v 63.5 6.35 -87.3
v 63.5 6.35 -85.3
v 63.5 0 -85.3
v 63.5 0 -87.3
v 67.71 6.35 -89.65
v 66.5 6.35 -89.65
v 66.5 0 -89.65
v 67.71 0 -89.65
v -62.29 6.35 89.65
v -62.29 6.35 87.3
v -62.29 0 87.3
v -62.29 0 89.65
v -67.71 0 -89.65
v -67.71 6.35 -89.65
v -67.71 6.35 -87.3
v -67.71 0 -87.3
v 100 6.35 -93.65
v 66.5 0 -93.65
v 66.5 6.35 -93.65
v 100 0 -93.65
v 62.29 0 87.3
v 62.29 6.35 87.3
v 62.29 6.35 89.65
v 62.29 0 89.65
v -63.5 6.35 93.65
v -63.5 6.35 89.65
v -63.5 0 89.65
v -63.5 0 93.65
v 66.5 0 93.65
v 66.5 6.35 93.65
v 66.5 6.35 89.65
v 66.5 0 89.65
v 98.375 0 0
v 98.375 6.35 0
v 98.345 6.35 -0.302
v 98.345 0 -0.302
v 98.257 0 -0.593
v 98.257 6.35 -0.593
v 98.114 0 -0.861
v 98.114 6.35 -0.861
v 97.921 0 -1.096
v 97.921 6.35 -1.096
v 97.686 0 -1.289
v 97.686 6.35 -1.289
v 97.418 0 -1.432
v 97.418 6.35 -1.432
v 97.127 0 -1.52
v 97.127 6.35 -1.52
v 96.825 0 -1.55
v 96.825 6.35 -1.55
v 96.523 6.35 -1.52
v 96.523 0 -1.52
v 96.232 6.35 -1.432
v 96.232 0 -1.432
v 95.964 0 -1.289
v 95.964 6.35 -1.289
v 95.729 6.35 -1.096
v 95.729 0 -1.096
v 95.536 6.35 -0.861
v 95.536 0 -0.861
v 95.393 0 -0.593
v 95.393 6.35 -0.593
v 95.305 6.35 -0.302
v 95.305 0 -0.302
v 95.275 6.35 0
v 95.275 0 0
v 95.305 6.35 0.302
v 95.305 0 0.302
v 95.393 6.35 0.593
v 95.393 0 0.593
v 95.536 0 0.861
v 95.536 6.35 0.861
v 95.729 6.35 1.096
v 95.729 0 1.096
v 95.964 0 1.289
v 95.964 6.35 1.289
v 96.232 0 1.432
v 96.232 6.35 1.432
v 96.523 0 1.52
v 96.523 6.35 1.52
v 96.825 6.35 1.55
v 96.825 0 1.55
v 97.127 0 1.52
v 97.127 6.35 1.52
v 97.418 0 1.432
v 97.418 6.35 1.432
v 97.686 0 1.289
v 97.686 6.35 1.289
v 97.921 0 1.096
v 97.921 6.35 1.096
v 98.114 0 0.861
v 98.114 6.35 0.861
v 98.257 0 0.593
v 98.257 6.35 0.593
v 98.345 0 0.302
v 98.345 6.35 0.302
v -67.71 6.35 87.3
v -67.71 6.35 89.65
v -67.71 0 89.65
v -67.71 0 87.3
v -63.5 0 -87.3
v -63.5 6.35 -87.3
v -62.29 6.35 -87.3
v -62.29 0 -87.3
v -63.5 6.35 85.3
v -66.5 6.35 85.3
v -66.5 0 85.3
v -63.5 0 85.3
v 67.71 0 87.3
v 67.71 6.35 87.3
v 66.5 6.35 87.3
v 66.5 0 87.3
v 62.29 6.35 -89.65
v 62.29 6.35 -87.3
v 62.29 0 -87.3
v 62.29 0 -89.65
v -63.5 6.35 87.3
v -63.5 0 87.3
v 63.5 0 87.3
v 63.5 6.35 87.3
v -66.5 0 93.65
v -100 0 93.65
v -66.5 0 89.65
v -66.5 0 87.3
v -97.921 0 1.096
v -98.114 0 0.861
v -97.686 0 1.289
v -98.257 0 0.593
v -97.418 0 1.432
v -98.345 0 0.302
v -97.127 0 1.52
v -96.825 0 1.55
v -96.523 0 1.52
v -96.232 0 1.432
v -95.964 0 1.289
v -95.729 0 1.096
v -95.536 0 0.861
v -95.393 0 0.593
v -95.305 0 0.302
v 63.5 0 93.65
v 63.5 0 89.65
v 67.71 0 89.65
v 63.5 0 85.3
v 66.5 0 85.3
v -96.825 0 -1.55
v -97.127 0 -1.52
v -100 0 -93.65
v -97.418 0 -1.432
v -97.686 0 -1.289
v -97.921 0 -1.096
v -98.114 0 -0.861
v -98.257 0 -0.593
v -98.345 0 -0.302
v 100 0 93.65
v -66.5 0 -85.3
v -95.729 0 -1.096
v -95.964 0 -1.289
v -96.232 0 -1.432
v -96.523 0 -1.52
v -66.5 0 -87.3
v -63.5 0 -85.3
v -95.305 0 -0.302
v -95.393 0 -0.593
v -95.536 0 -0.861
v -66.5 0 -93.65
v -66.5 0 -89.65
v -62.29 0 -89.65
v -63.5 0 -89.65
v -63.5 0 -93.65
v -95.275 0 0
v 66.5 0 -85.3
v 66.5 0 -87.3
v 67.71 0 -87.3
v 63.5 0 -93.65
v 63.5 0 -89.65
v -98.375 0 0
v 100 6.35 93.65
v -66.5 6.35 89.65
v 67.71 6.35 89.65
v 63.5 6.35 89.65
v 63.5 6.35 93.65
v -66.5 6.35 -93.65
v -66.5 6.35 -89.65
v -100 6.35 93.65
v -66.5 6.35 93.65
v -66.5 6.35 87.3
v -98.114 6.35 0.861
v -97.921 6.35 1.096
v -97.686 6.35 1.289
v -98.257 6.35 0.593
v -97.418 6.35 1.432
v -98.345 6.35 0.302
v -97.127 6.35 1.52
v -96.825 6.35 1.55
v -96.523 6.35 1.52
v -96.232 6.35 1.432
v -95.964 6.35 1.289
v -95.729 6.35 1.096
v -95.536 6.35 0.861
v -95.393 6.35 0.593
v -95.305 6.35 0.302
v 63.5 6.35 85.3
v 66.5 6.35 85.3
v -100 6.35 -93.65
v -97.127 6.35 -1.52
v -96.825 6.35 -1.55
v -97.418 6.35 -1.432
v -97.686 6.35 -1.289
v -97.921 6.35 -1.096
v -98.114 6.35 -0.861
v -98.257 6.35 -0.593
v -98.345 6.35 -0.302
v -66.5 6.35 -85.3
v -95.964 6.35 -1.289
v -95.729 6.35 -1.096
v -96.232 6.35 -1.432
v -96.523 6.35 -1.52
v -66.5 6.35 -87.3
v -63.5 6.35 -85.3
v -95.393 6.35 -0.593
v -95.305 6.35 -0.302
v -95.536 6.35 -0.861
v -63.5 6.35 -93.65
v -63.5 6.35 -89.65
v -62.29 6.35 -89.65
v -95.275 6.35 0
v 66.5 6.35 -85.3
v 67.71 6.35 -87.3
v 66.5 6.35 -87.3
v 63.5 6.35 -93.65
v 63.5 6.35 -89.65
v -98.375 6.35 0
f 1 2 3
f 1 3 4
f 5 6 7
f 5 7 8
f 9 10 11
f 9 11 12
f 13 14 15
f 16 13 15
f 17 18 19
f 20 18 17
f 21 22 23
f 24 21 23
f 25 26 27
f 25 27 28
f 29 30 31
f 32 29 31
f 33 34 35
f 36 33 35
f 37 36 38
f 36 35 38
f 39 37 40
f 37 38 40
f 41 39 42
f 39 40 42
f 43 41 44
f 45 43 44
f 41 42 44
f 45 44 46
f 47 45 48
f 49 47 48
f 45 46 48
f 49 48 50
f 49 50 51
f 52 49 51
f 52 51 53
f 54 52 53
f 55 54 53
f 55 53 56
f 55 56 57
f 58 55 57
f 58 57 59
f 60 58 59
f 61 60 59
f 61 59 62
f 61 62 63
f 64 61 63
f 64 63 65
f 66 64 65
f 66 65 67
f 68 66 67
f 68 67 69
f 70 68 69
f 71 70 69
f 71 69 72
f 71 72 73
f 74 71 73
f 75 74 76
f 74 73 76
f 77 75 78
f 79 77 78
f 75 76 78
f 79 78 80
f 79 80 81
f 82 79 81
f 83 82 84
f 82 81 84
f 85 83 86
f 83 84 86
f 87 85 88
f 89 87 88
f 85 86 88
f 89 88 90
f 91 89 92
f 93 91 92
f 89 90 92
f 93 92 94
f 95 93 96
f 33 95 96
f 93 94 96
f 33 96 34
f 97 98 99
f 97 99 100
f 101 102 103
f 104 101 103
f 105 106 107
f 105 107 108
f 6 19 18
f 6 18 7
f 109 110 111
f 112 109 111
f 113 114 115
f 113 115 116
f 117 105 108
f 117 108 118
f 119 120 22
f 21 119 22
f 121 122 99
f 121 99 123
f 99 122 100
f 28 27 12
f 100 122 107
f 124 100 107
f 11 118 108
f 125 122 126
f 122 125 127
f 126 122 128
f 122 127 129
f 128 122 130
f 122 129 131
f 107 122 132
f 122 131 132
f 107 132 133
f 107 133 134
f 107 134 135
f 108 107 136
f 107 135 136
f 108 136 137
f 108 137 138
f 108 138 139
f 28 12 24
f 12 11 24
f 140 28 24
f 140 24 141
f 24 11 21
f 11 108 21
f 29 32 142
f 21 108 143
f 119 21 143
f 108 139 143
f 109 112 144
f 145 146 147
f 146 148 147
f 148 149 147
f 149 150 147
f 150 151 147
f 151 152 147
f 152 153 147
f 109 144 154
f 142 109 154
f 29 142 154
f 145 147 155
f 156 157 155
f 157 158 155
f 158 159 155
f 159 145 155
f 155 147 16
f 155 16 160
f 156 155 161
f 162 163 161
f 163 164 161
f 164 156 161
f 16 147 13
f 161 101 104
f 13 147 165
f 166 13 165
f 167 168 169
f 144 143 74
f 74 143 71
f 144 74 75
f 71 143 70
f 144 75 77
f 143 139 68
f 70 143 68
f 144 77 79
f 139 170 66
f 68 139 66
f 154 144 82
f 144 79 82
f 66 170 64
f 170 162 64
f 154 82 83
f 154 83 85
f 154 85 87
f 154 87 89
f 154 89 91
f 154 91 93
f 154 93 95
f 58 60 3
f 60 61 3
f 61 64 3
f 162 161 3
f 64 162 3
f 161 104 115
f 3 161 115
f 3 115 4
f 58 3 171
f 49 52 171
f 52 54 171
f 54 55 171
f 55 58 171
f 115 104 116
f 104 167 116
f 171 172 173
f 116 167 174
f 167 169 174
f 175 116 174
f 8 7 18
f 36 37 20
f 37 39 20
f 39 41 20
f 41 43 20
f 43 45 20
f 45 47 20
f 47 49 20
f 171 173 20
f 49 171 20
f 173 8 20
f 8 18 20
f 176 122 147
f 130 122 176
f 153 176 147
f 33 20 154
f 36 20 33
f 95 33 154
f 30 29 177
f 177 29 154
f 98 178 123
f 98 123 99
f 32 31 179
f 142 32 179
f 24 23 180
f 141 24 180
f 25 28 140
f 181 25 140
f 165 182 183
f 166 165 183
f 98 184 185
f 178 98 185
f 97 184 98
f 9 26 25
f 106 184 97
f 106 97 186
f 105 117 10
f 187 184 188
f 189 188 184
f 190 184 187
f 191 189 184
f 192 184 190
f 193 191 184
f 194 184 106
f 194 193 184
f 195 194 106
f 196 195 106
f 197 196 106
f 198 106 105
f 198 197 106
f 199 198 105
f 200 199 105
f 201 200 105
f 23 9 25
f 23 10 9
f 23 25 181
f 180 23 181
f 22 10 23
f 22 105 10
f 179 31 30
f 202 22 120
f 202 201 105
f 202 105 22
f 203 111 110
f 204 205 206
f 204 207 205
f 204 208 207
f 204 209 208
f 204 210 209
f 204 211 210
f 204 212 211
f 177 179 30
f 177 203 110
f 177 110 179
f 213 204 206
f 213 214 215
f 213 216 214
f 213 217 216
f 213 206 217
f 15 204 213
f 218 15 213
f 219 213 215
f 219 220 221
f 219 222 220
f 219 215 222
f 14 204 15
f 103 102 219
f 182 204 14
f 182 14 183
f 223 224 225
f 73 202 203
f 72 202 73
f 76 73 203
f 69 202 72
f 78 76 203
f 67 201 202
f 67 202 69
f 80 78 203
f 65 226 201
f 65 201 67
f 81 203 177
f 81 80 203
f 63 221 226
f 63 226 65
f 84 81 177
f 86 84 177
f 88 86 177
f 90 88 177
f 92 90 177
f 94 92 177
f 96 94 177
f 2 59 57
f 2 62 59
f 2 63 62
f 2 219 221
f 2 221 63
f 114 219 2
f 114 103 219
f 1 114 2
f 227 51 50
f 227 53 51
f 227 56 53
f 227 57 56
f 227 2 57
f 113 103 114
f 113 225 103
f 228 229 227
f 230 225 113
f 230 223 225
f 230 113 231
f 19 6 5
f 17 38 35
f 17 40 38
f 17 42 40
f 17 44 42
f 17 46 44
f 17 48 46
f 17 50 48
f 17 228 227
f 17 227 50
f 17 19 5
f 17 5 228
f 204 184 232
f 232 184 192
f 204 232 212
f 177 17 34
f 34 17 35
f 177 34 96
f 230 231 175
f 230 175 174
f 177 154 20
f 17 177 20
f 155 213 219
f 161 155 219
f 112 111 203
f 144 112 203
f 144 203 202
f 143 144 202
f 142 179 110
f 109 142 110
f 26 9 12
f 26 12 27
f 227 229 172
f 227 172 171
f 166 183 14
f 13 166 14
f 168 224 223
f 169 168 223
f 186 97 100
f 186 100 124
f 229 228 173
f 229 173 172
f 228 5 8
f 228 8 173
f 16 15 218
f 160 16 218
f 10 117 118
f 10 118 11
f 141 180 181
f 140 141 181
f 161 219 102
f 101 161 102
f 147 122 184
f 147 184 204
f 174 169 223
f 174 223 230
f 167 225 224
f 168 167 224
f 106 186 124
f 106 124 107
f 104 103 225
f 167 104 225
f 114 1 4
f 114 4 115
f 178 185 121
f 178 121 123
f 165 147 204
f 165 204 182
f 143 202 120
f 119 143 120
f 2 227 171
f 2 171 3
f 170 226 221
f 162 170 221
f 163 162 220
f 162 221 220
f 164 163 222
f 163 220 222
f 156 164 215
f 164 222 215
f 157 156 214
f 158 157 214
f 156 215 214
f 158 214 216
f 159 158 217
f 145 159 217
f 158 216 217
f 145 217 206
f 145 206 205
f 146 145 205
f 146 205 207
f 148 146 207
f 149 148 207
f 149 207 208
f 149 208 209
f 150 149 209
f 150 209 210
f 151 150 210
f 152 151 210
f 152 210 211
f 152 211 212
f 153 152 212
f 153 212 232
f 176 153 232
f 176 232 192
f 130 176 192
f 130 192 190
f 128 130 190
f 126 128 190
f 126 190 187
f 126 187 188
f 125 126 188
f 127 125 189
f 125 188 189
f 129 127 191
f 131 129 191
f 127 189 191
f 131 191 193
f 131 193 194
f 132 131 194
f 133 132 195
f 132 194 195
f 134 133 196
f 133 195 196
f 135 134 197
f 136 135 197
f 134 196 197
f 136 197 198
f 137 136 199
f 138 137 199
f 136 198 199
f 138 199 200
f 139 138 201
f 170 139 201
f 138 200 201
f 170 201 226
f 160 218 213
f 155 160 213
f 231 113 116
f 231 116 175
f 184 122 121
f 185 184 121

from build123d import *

# Parameters (mm, degrees)
SKETCH1_W           = 200
SKETCH1_H           = 187.3
BOSS_EXTRUDE1_DEPTH = 6.35
SKETCH2_R           = 1.55
CUT_EXTRUDE1_DEPTH  = 7.35


with BuildPart() as part:
    # Sketch1 → Boss-Extrude1 (new body)
    with BuildSketch(Plane(origin=(0, 0, 0), x_dir=(1, 0, 0), z_dir=(0, 1, 0))):
        Rectangle(SKETCH1_W, SKETCH1_H)
    extrude(amount=BOSS_EXTRUDE1_DEPTH)

    # Sketch2 → Cut-Extrude1 (cut, through all)
    with BuildSketch(Plane(origin=(0, 6.35, 0), x_dir=(1, 0, 0), z_dir=(0, 1, 0))):
        with Locations((-96.825, 0)):
            Circle(SKETCH2_R)
        with Locations((96.825, 0)):
            Circle(SKETCH2_R)
        Polygon((-63.5, 87.3), (-62.29, 87.3), (-62.29, 89.65), (-63.5, 89.65), (-63.5, 93.65), (-66.5, 93.65), (-66.5, 89.65), (-67.71, 89.65), (-67.71, 87.3), (-66.5, 87.3), (-66.5, 85.3), (-63.5, 85.3), align=None)
        Polygon((66.5, 93.65), (66.5, 89.65), (67.71, 89.65), (67.71, 87.3), (66.5, 87.3), (66.5, 85.3), (63.5, 85.3), (63.5, 87.3), (62.29, 87.3), (62.29, 89.65), (63.5, 89.65), (63.5, 93.65), align=None)
        Polygon((63.5, -87.3), (62.29, -87.3), (62.29, -89.65), (63.5, -89.65), (63.5, -93.65), (66.5, -93.65), (66.5, -89.65), (67.71, -89.65), (67.71, -87.3), (66.5, -87.3), (66.5, -85.3), (63.5, -85.3), align=None)
        Polygon((-66.5, -93.65), (-66.5, -89.65), (-67.71, -89.65), (-67.71, -87.3), (-66.5, -87.3), (-66.5, -85.3), (-63.5, -85.3), (-63.5, -87.3), (-62.29, -87.3), (-62.29, -89.65), (-63.5, -89.65), (-63.5, -93.65), align=None)
    extrude(amount=-CUT_EXTRUDE1_DEPTH, mode=Mode.SUBTRACT)


solid = part.part
